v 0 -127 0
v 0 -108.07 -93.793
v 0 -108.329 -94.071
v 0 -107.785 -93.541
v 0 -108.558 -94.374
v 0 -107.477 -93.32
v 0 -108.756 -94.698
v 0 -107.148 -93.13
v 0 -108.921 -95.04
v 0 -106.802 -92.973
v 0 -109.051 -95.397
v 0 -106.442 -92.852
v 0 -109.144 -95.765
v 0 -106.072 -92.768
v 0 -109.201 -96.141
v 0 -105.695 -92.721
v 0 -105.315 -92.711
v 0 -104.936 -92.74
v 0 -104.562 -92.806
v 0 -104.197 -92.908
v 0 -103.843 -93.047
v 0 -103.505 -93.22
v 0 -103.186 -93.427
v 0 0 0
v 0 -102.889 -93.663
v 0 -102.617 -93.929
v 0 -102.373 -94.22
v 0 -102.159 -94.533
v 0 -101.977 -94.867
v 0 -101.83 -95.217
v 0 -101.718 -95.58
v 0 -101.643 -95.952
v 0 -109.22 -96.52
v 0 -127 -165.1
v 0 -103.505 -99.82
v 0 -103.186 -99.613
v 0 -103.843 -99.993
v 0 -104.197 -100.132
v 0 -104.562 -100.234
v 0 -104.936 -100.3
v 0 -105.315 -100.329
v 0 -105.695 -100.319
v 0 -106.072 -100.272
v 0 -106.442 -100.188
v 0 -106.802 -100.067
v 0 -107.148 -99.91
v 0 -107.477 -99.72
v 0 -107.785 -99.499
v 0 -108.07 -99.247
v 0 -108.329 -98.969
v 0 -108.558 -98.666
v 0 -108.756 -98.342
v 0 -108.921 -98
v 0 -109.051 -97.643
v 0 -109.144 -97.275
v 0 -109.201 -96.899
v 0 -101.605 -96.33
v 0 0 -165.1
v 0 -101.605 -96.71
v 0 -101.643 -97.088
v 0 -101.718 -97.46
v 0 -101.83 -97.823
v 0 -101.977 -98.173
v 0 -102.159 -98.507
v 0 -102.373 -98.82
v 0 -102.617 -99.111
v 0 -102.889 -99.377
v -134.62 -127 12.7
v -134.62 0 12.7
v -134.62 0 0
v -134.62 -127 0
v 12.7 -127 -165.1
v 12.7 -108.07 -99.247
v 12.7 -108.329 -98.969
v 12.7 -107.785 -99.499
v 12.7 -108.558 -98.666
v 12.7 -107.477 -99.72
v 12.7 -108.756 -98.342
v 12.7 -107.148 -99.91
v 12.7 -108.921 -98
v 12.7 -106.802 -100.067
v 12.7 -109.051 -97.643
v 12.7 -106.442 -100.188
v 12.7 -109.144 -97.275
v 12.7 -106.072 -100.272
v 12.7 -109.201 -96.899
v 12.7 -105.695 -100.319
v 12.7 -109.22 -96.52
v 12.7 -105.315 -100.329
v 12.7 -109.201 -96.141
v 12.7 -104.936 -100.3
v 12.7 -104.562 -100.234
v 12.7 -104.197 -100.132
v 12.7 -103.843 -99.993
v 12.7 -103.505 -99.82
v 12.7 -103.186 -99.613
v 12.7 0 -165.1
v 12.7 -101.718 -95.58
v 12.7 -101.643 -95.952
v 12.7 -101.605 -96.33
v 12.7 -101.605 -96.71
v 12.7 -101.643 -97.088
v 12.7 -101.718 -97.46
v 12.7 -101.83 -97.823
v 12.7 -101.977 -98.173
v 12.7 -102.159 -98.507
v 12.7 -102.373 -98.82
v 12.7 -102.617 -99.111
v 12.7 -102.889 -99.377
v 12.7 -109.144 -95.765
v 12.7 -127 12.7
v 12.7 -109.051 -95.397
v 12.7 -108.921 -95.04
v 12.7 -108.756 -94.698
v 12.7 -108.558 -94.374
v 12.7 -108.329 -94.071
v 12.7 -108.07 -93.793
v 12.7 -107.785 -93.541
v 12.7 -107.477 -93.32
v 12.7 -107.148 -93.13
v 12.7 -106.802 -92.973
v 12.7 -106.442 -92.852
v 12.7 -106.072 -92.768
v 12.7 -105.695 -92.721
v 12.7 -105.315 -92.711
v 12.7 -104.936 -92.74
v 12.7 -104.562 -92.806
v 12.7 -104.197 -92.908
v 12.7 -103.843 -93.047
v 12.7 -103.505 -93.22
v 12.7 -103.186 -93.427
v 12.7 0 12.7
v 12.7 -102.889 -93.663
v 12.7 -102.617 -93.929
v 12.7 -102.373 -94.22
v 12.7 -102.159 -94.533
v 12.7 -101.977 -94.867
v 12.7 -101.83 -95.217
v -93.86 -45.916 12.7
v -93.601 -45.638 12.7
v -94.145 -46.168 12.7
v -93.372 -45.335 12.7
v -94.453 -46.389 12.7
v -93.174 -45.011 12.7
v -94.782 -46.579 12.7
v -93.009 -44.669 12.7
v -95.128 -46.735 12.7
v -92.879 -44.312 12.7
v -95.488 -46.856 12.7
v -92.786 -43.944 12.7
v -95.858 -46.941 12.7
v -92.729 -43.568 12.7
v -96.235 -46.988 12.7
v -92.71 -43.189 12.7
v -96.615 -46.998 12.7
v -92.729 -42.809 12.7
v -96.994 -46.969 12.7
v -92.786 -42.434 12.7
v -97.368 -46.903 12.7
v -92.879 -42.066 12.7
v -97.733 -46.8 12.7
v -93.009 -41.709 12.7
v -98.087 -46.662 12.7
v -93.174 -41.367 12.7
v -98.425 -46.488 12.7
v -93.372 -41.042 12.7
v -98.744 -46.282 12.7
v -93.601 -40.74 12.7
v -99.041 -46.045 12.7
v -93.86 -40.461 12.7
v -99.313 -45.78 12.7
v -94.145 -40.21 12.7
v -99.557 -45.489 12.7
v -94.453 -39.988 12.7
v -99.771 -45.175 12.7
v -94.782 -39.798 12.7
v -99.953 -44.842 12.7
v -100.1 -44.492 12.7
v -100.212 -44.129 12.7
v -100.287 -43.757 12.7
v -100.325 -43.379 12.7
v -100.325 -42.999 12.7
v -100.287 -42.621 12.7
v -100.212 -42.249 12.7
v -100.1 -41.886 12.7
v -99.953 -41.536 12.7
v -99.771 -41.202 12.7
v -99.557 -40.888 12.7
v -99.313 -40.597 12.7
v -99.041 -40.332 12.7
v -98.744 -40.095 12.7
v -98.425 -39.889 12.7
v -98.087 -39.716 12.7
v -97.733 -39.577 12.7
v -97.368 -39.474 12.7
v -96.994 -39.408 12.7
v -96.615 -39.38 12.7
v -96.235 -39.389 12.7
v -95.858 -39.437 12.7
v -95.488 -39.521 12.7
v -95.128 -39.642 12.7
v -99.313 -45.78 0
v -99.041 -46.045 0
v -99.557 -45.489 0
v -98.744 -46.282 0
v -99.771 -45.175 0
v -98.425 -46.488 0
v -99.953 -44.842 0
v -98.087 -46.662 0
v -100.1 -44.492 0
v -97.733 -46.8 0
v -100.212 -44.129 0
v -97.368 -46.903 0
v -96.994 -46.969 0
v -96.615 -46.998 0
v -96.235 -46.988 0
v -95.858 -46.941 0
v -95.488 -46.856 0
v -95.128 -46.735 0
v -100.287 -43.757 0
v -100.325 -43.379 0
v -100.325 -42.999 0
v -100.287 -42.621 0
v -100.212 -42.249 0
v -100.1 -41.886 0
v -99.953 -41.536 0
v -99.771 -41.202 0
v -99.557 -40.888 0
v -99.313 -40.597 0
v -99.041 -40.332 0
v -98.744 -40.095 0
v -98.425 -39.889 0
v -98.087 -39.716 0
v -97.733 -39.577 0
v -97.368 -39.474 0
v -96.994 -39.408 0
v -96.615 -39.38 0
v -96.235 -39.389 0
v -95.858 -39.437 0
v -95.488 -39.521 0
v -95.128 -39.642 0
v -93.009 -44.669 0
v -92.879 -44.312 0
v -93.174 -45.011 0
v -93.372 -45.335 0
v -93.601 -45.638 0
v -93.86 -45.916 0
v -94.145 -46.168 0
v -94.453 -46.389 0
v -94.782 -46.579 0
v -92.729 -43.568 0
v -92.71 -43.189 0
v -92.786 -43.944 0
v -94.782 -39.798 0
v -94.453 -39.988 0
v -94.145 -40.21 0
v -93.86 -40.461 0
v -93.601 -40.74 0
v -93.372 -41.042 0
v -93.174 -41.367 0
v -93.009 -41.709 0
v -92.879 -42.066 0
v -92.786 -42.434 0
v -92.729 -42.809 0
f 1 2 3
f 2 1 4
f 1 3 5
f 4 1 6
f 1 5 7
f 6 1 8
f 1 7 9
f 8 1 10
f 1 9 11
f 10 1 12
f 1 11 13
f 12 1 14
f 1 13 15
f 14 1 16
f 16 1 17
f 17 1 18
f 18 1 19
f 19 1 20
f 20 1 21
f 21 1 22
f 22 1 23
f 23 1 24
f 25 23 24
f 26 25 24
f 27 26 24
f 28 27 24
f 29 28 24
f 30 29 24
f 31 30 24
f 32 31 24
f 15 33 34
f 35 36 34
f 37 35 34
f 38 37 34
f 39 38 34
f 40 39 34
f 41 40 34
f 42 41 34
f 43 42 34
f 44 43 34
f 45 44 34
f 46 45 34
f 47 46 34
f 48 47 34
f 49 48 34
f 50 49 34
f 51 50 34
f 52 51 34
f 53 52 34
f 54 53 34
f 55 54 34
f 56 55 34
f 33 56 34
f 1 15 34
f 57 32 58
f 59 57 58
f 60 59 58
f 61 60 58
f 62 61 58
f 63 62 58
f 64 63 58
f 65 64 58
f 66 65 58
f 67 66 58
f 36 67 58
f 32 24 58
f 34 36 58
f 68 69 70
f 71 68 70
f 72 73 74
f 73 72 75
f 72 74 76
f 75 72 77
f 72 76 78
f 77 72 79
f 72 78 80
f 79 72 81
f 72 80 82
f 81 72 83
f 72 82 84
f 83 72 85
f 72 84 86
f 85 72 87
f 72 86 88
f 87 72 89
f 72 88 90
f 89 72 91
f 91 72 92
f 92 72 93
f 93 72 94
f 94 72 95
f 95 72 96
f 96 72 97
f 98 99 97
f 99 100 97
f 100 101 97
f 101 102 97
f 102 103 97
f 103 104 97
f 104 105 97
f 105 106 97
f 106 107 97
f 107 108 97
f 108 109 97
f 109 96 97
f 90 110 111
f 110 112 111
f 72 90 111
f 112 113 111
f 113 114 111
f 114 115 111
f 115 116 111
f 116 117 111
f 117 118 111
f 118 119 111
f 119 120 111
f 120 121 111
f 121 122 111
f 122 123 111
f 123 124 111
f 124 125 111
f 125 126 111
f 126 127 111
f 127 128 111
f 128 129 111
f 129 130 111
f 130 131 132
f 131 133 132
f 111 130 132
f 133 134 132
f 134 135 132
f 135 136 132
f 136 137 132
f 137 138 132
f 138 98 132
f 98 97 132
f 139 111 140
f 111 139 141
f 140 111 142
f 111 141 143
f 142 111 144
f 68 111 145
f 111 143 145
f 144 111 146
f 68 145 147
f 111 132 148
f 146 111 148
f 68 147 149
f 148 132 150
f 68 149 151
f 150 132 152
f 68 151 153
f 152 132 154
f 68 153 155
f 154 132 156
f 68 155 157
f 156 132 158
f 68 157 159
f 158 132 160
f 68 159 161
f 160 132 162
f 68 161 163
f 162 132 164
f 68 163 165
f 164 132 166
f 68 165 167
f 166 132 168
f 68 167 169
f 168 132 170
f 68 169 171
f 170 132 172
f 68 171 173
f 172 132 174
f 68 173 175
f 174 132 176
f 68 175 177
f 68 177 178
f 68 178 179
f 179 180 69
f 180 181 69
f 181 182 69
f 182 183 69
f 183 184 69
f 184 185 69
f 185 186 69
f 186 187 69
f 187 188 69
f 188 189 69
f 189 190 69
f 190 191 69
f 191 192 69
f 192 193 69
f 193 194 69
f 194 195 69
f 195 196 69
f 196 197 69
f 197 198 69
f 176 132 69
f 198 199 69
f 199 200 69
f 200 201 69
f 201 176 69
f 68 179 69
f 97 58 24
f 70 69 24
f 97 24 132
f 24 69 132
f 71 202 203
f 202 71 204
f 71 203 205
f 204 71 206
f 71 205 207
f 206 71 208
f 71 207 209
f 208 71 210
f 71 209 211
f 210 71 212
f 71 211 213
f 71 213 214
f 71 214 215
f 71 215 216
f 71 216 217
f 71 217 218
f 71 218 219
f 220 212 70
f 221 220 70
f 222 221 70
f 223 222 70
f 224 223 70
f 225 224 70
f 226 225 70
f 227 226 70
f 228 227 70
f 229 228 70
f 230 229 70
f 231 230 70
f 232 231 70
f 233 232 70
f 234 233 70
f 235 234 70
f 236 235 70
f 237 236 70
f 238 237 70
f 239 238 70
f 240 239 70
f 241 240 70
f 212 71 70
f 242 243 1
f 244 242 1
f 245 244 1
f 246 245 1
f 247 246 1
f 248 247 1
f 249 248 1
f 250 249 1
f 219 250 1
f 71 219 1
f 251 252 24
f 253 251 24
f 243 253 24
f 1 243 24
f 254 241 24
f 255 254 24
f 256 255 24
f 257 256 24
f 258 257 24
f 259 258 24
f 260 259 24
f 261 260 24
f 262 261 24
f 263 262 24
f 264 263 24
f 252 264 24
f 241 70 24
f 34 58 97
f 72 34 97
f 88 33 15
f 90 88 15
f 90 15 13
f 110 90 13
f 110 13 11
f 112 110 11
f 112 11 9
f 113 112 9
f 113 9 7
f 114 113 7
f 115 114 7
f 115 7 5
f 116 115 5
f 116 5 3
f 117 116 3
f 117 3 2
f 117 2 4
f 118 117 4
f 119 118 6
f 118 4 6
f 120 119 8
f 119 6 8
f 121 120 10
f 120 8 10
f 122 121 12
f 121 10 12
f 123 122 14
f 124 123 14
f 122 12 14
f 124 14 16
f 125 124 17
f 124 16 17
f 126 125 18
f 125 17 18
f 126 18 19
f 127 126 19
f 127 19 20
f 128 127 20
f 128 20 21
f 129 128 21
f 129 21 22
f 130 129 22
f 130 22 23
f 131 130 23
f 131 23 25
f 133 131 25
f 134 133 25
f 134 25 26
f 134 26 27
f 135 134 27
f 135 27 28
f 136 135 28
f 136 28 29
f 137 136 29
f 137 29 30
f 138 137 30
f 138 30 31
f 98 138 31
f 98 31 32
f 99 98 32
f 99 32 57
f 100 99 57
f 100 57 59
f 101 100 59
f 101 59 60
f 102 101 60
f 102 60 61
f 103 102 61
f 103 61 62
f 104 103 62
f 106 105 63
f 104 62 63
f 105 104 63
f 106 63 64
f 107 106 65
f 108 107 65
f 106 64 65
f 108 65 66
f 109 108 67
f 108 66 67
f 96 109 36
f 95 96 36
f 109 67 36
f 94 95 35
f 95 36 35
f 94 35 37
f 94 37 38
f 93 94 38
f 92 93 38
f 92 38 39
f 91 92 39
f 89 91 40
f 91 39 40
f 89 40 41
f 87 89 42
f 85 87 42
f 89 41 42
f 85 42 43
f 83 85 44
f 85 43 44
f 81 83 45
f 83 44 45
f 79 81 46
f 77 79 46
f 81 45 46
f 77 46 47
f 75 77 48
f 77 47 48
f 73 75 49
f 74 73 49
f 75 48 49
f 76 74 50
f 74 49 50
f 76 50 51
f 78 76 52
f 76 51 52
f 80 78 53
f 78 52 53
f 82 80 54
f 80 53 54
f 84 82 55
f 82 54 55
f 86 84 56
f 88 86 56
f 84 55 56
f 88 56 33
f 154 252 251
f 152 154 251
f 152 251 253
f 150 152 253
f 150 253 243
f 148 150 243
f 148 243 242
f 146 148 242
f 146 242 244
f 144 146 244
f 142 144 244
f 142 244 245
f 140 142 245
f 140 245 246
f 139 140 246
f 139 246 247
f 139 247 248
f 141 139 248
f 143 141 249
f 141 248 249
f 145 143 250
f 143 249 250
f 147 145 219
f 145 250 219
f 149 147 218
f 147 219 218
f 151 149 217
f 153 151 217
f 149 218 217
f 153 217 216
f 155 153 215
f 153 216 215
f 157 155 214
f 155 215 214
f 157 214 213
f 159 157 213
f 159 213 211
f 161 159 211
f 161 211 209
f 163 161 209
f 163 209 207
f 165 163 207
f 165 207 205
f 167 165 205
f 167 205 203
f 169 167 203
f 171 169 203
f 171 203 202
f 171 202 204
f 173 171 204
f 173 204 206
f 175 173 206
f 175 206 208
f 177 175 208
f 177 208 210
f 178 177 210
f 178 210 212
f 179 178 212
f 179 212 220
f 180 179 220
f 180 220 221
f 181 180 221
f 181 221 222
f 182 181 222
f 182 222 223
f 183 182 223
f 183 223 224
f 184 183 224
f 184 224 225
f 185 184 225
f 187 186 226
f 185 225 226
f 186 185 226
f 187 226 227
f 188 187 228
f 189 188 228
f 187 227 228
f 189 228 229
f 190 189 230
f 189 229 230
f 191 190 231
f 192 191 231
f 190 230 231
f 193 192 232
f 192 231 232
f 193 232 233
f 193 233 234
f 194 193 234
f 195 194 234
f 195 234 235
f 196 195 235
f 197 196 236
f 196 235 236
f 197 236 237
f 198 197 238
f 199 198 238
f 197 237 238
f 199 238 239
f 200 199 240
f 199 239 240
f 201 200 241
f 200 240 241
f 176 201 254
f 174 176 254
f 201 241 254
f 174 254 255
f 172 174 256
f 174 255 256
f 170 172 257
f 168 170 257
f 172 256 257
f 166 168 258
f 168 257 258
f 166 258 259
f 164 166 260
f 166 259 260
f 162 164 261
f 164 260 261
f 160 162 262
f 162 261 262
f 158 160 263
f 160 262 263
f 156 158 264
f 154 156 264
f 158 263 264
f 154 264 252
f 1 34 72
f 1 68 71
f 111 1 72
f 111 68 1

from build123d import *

# Parameters (mm, degrees)
F1_DEPTH = 127
F2_R     = 3.81
F3_DEPTH = 25.4
F4_R     = 3.81
F5_DEPTH = 25.4


with BuildPart() as f1:
    # F0 (on Front) → F1 (new body)
    with BuildSketch(Plane.XZ):
        Polygon((-134.62, 0), (0, 0), (0, -165.1), (12.7, -165.1), (12.7, 12.7), (-134.62, 12.7), align=None)
    extrude(amount=F1_DEPTH)

    # F2 (on face) → F3 (cut)
    with BuildSketch(Plane(origin=(0, 0, 0), x_dir=(1, 0, 0), z_dir=(0, 0, -1))):
        with Locations((-96.52, 43.188728)):
            Circle(F2_R)
    extrude(amount=-F3_DEPTH, mode=Mode.SUBTRACT)

    # F4 (on face) → F5 (cut)
    with BuildSketch(Plane(origin=(0, 0, 0), x_dir=(0, -1, 0), z_dir=(-1, 0, 0))):
        with Locations((105.41, -96.52)):
            Circle(F4_R)
    extrude(amount=-F5_DEPTH, mode=Mode.SUBTRACT)


solid = f1.part
